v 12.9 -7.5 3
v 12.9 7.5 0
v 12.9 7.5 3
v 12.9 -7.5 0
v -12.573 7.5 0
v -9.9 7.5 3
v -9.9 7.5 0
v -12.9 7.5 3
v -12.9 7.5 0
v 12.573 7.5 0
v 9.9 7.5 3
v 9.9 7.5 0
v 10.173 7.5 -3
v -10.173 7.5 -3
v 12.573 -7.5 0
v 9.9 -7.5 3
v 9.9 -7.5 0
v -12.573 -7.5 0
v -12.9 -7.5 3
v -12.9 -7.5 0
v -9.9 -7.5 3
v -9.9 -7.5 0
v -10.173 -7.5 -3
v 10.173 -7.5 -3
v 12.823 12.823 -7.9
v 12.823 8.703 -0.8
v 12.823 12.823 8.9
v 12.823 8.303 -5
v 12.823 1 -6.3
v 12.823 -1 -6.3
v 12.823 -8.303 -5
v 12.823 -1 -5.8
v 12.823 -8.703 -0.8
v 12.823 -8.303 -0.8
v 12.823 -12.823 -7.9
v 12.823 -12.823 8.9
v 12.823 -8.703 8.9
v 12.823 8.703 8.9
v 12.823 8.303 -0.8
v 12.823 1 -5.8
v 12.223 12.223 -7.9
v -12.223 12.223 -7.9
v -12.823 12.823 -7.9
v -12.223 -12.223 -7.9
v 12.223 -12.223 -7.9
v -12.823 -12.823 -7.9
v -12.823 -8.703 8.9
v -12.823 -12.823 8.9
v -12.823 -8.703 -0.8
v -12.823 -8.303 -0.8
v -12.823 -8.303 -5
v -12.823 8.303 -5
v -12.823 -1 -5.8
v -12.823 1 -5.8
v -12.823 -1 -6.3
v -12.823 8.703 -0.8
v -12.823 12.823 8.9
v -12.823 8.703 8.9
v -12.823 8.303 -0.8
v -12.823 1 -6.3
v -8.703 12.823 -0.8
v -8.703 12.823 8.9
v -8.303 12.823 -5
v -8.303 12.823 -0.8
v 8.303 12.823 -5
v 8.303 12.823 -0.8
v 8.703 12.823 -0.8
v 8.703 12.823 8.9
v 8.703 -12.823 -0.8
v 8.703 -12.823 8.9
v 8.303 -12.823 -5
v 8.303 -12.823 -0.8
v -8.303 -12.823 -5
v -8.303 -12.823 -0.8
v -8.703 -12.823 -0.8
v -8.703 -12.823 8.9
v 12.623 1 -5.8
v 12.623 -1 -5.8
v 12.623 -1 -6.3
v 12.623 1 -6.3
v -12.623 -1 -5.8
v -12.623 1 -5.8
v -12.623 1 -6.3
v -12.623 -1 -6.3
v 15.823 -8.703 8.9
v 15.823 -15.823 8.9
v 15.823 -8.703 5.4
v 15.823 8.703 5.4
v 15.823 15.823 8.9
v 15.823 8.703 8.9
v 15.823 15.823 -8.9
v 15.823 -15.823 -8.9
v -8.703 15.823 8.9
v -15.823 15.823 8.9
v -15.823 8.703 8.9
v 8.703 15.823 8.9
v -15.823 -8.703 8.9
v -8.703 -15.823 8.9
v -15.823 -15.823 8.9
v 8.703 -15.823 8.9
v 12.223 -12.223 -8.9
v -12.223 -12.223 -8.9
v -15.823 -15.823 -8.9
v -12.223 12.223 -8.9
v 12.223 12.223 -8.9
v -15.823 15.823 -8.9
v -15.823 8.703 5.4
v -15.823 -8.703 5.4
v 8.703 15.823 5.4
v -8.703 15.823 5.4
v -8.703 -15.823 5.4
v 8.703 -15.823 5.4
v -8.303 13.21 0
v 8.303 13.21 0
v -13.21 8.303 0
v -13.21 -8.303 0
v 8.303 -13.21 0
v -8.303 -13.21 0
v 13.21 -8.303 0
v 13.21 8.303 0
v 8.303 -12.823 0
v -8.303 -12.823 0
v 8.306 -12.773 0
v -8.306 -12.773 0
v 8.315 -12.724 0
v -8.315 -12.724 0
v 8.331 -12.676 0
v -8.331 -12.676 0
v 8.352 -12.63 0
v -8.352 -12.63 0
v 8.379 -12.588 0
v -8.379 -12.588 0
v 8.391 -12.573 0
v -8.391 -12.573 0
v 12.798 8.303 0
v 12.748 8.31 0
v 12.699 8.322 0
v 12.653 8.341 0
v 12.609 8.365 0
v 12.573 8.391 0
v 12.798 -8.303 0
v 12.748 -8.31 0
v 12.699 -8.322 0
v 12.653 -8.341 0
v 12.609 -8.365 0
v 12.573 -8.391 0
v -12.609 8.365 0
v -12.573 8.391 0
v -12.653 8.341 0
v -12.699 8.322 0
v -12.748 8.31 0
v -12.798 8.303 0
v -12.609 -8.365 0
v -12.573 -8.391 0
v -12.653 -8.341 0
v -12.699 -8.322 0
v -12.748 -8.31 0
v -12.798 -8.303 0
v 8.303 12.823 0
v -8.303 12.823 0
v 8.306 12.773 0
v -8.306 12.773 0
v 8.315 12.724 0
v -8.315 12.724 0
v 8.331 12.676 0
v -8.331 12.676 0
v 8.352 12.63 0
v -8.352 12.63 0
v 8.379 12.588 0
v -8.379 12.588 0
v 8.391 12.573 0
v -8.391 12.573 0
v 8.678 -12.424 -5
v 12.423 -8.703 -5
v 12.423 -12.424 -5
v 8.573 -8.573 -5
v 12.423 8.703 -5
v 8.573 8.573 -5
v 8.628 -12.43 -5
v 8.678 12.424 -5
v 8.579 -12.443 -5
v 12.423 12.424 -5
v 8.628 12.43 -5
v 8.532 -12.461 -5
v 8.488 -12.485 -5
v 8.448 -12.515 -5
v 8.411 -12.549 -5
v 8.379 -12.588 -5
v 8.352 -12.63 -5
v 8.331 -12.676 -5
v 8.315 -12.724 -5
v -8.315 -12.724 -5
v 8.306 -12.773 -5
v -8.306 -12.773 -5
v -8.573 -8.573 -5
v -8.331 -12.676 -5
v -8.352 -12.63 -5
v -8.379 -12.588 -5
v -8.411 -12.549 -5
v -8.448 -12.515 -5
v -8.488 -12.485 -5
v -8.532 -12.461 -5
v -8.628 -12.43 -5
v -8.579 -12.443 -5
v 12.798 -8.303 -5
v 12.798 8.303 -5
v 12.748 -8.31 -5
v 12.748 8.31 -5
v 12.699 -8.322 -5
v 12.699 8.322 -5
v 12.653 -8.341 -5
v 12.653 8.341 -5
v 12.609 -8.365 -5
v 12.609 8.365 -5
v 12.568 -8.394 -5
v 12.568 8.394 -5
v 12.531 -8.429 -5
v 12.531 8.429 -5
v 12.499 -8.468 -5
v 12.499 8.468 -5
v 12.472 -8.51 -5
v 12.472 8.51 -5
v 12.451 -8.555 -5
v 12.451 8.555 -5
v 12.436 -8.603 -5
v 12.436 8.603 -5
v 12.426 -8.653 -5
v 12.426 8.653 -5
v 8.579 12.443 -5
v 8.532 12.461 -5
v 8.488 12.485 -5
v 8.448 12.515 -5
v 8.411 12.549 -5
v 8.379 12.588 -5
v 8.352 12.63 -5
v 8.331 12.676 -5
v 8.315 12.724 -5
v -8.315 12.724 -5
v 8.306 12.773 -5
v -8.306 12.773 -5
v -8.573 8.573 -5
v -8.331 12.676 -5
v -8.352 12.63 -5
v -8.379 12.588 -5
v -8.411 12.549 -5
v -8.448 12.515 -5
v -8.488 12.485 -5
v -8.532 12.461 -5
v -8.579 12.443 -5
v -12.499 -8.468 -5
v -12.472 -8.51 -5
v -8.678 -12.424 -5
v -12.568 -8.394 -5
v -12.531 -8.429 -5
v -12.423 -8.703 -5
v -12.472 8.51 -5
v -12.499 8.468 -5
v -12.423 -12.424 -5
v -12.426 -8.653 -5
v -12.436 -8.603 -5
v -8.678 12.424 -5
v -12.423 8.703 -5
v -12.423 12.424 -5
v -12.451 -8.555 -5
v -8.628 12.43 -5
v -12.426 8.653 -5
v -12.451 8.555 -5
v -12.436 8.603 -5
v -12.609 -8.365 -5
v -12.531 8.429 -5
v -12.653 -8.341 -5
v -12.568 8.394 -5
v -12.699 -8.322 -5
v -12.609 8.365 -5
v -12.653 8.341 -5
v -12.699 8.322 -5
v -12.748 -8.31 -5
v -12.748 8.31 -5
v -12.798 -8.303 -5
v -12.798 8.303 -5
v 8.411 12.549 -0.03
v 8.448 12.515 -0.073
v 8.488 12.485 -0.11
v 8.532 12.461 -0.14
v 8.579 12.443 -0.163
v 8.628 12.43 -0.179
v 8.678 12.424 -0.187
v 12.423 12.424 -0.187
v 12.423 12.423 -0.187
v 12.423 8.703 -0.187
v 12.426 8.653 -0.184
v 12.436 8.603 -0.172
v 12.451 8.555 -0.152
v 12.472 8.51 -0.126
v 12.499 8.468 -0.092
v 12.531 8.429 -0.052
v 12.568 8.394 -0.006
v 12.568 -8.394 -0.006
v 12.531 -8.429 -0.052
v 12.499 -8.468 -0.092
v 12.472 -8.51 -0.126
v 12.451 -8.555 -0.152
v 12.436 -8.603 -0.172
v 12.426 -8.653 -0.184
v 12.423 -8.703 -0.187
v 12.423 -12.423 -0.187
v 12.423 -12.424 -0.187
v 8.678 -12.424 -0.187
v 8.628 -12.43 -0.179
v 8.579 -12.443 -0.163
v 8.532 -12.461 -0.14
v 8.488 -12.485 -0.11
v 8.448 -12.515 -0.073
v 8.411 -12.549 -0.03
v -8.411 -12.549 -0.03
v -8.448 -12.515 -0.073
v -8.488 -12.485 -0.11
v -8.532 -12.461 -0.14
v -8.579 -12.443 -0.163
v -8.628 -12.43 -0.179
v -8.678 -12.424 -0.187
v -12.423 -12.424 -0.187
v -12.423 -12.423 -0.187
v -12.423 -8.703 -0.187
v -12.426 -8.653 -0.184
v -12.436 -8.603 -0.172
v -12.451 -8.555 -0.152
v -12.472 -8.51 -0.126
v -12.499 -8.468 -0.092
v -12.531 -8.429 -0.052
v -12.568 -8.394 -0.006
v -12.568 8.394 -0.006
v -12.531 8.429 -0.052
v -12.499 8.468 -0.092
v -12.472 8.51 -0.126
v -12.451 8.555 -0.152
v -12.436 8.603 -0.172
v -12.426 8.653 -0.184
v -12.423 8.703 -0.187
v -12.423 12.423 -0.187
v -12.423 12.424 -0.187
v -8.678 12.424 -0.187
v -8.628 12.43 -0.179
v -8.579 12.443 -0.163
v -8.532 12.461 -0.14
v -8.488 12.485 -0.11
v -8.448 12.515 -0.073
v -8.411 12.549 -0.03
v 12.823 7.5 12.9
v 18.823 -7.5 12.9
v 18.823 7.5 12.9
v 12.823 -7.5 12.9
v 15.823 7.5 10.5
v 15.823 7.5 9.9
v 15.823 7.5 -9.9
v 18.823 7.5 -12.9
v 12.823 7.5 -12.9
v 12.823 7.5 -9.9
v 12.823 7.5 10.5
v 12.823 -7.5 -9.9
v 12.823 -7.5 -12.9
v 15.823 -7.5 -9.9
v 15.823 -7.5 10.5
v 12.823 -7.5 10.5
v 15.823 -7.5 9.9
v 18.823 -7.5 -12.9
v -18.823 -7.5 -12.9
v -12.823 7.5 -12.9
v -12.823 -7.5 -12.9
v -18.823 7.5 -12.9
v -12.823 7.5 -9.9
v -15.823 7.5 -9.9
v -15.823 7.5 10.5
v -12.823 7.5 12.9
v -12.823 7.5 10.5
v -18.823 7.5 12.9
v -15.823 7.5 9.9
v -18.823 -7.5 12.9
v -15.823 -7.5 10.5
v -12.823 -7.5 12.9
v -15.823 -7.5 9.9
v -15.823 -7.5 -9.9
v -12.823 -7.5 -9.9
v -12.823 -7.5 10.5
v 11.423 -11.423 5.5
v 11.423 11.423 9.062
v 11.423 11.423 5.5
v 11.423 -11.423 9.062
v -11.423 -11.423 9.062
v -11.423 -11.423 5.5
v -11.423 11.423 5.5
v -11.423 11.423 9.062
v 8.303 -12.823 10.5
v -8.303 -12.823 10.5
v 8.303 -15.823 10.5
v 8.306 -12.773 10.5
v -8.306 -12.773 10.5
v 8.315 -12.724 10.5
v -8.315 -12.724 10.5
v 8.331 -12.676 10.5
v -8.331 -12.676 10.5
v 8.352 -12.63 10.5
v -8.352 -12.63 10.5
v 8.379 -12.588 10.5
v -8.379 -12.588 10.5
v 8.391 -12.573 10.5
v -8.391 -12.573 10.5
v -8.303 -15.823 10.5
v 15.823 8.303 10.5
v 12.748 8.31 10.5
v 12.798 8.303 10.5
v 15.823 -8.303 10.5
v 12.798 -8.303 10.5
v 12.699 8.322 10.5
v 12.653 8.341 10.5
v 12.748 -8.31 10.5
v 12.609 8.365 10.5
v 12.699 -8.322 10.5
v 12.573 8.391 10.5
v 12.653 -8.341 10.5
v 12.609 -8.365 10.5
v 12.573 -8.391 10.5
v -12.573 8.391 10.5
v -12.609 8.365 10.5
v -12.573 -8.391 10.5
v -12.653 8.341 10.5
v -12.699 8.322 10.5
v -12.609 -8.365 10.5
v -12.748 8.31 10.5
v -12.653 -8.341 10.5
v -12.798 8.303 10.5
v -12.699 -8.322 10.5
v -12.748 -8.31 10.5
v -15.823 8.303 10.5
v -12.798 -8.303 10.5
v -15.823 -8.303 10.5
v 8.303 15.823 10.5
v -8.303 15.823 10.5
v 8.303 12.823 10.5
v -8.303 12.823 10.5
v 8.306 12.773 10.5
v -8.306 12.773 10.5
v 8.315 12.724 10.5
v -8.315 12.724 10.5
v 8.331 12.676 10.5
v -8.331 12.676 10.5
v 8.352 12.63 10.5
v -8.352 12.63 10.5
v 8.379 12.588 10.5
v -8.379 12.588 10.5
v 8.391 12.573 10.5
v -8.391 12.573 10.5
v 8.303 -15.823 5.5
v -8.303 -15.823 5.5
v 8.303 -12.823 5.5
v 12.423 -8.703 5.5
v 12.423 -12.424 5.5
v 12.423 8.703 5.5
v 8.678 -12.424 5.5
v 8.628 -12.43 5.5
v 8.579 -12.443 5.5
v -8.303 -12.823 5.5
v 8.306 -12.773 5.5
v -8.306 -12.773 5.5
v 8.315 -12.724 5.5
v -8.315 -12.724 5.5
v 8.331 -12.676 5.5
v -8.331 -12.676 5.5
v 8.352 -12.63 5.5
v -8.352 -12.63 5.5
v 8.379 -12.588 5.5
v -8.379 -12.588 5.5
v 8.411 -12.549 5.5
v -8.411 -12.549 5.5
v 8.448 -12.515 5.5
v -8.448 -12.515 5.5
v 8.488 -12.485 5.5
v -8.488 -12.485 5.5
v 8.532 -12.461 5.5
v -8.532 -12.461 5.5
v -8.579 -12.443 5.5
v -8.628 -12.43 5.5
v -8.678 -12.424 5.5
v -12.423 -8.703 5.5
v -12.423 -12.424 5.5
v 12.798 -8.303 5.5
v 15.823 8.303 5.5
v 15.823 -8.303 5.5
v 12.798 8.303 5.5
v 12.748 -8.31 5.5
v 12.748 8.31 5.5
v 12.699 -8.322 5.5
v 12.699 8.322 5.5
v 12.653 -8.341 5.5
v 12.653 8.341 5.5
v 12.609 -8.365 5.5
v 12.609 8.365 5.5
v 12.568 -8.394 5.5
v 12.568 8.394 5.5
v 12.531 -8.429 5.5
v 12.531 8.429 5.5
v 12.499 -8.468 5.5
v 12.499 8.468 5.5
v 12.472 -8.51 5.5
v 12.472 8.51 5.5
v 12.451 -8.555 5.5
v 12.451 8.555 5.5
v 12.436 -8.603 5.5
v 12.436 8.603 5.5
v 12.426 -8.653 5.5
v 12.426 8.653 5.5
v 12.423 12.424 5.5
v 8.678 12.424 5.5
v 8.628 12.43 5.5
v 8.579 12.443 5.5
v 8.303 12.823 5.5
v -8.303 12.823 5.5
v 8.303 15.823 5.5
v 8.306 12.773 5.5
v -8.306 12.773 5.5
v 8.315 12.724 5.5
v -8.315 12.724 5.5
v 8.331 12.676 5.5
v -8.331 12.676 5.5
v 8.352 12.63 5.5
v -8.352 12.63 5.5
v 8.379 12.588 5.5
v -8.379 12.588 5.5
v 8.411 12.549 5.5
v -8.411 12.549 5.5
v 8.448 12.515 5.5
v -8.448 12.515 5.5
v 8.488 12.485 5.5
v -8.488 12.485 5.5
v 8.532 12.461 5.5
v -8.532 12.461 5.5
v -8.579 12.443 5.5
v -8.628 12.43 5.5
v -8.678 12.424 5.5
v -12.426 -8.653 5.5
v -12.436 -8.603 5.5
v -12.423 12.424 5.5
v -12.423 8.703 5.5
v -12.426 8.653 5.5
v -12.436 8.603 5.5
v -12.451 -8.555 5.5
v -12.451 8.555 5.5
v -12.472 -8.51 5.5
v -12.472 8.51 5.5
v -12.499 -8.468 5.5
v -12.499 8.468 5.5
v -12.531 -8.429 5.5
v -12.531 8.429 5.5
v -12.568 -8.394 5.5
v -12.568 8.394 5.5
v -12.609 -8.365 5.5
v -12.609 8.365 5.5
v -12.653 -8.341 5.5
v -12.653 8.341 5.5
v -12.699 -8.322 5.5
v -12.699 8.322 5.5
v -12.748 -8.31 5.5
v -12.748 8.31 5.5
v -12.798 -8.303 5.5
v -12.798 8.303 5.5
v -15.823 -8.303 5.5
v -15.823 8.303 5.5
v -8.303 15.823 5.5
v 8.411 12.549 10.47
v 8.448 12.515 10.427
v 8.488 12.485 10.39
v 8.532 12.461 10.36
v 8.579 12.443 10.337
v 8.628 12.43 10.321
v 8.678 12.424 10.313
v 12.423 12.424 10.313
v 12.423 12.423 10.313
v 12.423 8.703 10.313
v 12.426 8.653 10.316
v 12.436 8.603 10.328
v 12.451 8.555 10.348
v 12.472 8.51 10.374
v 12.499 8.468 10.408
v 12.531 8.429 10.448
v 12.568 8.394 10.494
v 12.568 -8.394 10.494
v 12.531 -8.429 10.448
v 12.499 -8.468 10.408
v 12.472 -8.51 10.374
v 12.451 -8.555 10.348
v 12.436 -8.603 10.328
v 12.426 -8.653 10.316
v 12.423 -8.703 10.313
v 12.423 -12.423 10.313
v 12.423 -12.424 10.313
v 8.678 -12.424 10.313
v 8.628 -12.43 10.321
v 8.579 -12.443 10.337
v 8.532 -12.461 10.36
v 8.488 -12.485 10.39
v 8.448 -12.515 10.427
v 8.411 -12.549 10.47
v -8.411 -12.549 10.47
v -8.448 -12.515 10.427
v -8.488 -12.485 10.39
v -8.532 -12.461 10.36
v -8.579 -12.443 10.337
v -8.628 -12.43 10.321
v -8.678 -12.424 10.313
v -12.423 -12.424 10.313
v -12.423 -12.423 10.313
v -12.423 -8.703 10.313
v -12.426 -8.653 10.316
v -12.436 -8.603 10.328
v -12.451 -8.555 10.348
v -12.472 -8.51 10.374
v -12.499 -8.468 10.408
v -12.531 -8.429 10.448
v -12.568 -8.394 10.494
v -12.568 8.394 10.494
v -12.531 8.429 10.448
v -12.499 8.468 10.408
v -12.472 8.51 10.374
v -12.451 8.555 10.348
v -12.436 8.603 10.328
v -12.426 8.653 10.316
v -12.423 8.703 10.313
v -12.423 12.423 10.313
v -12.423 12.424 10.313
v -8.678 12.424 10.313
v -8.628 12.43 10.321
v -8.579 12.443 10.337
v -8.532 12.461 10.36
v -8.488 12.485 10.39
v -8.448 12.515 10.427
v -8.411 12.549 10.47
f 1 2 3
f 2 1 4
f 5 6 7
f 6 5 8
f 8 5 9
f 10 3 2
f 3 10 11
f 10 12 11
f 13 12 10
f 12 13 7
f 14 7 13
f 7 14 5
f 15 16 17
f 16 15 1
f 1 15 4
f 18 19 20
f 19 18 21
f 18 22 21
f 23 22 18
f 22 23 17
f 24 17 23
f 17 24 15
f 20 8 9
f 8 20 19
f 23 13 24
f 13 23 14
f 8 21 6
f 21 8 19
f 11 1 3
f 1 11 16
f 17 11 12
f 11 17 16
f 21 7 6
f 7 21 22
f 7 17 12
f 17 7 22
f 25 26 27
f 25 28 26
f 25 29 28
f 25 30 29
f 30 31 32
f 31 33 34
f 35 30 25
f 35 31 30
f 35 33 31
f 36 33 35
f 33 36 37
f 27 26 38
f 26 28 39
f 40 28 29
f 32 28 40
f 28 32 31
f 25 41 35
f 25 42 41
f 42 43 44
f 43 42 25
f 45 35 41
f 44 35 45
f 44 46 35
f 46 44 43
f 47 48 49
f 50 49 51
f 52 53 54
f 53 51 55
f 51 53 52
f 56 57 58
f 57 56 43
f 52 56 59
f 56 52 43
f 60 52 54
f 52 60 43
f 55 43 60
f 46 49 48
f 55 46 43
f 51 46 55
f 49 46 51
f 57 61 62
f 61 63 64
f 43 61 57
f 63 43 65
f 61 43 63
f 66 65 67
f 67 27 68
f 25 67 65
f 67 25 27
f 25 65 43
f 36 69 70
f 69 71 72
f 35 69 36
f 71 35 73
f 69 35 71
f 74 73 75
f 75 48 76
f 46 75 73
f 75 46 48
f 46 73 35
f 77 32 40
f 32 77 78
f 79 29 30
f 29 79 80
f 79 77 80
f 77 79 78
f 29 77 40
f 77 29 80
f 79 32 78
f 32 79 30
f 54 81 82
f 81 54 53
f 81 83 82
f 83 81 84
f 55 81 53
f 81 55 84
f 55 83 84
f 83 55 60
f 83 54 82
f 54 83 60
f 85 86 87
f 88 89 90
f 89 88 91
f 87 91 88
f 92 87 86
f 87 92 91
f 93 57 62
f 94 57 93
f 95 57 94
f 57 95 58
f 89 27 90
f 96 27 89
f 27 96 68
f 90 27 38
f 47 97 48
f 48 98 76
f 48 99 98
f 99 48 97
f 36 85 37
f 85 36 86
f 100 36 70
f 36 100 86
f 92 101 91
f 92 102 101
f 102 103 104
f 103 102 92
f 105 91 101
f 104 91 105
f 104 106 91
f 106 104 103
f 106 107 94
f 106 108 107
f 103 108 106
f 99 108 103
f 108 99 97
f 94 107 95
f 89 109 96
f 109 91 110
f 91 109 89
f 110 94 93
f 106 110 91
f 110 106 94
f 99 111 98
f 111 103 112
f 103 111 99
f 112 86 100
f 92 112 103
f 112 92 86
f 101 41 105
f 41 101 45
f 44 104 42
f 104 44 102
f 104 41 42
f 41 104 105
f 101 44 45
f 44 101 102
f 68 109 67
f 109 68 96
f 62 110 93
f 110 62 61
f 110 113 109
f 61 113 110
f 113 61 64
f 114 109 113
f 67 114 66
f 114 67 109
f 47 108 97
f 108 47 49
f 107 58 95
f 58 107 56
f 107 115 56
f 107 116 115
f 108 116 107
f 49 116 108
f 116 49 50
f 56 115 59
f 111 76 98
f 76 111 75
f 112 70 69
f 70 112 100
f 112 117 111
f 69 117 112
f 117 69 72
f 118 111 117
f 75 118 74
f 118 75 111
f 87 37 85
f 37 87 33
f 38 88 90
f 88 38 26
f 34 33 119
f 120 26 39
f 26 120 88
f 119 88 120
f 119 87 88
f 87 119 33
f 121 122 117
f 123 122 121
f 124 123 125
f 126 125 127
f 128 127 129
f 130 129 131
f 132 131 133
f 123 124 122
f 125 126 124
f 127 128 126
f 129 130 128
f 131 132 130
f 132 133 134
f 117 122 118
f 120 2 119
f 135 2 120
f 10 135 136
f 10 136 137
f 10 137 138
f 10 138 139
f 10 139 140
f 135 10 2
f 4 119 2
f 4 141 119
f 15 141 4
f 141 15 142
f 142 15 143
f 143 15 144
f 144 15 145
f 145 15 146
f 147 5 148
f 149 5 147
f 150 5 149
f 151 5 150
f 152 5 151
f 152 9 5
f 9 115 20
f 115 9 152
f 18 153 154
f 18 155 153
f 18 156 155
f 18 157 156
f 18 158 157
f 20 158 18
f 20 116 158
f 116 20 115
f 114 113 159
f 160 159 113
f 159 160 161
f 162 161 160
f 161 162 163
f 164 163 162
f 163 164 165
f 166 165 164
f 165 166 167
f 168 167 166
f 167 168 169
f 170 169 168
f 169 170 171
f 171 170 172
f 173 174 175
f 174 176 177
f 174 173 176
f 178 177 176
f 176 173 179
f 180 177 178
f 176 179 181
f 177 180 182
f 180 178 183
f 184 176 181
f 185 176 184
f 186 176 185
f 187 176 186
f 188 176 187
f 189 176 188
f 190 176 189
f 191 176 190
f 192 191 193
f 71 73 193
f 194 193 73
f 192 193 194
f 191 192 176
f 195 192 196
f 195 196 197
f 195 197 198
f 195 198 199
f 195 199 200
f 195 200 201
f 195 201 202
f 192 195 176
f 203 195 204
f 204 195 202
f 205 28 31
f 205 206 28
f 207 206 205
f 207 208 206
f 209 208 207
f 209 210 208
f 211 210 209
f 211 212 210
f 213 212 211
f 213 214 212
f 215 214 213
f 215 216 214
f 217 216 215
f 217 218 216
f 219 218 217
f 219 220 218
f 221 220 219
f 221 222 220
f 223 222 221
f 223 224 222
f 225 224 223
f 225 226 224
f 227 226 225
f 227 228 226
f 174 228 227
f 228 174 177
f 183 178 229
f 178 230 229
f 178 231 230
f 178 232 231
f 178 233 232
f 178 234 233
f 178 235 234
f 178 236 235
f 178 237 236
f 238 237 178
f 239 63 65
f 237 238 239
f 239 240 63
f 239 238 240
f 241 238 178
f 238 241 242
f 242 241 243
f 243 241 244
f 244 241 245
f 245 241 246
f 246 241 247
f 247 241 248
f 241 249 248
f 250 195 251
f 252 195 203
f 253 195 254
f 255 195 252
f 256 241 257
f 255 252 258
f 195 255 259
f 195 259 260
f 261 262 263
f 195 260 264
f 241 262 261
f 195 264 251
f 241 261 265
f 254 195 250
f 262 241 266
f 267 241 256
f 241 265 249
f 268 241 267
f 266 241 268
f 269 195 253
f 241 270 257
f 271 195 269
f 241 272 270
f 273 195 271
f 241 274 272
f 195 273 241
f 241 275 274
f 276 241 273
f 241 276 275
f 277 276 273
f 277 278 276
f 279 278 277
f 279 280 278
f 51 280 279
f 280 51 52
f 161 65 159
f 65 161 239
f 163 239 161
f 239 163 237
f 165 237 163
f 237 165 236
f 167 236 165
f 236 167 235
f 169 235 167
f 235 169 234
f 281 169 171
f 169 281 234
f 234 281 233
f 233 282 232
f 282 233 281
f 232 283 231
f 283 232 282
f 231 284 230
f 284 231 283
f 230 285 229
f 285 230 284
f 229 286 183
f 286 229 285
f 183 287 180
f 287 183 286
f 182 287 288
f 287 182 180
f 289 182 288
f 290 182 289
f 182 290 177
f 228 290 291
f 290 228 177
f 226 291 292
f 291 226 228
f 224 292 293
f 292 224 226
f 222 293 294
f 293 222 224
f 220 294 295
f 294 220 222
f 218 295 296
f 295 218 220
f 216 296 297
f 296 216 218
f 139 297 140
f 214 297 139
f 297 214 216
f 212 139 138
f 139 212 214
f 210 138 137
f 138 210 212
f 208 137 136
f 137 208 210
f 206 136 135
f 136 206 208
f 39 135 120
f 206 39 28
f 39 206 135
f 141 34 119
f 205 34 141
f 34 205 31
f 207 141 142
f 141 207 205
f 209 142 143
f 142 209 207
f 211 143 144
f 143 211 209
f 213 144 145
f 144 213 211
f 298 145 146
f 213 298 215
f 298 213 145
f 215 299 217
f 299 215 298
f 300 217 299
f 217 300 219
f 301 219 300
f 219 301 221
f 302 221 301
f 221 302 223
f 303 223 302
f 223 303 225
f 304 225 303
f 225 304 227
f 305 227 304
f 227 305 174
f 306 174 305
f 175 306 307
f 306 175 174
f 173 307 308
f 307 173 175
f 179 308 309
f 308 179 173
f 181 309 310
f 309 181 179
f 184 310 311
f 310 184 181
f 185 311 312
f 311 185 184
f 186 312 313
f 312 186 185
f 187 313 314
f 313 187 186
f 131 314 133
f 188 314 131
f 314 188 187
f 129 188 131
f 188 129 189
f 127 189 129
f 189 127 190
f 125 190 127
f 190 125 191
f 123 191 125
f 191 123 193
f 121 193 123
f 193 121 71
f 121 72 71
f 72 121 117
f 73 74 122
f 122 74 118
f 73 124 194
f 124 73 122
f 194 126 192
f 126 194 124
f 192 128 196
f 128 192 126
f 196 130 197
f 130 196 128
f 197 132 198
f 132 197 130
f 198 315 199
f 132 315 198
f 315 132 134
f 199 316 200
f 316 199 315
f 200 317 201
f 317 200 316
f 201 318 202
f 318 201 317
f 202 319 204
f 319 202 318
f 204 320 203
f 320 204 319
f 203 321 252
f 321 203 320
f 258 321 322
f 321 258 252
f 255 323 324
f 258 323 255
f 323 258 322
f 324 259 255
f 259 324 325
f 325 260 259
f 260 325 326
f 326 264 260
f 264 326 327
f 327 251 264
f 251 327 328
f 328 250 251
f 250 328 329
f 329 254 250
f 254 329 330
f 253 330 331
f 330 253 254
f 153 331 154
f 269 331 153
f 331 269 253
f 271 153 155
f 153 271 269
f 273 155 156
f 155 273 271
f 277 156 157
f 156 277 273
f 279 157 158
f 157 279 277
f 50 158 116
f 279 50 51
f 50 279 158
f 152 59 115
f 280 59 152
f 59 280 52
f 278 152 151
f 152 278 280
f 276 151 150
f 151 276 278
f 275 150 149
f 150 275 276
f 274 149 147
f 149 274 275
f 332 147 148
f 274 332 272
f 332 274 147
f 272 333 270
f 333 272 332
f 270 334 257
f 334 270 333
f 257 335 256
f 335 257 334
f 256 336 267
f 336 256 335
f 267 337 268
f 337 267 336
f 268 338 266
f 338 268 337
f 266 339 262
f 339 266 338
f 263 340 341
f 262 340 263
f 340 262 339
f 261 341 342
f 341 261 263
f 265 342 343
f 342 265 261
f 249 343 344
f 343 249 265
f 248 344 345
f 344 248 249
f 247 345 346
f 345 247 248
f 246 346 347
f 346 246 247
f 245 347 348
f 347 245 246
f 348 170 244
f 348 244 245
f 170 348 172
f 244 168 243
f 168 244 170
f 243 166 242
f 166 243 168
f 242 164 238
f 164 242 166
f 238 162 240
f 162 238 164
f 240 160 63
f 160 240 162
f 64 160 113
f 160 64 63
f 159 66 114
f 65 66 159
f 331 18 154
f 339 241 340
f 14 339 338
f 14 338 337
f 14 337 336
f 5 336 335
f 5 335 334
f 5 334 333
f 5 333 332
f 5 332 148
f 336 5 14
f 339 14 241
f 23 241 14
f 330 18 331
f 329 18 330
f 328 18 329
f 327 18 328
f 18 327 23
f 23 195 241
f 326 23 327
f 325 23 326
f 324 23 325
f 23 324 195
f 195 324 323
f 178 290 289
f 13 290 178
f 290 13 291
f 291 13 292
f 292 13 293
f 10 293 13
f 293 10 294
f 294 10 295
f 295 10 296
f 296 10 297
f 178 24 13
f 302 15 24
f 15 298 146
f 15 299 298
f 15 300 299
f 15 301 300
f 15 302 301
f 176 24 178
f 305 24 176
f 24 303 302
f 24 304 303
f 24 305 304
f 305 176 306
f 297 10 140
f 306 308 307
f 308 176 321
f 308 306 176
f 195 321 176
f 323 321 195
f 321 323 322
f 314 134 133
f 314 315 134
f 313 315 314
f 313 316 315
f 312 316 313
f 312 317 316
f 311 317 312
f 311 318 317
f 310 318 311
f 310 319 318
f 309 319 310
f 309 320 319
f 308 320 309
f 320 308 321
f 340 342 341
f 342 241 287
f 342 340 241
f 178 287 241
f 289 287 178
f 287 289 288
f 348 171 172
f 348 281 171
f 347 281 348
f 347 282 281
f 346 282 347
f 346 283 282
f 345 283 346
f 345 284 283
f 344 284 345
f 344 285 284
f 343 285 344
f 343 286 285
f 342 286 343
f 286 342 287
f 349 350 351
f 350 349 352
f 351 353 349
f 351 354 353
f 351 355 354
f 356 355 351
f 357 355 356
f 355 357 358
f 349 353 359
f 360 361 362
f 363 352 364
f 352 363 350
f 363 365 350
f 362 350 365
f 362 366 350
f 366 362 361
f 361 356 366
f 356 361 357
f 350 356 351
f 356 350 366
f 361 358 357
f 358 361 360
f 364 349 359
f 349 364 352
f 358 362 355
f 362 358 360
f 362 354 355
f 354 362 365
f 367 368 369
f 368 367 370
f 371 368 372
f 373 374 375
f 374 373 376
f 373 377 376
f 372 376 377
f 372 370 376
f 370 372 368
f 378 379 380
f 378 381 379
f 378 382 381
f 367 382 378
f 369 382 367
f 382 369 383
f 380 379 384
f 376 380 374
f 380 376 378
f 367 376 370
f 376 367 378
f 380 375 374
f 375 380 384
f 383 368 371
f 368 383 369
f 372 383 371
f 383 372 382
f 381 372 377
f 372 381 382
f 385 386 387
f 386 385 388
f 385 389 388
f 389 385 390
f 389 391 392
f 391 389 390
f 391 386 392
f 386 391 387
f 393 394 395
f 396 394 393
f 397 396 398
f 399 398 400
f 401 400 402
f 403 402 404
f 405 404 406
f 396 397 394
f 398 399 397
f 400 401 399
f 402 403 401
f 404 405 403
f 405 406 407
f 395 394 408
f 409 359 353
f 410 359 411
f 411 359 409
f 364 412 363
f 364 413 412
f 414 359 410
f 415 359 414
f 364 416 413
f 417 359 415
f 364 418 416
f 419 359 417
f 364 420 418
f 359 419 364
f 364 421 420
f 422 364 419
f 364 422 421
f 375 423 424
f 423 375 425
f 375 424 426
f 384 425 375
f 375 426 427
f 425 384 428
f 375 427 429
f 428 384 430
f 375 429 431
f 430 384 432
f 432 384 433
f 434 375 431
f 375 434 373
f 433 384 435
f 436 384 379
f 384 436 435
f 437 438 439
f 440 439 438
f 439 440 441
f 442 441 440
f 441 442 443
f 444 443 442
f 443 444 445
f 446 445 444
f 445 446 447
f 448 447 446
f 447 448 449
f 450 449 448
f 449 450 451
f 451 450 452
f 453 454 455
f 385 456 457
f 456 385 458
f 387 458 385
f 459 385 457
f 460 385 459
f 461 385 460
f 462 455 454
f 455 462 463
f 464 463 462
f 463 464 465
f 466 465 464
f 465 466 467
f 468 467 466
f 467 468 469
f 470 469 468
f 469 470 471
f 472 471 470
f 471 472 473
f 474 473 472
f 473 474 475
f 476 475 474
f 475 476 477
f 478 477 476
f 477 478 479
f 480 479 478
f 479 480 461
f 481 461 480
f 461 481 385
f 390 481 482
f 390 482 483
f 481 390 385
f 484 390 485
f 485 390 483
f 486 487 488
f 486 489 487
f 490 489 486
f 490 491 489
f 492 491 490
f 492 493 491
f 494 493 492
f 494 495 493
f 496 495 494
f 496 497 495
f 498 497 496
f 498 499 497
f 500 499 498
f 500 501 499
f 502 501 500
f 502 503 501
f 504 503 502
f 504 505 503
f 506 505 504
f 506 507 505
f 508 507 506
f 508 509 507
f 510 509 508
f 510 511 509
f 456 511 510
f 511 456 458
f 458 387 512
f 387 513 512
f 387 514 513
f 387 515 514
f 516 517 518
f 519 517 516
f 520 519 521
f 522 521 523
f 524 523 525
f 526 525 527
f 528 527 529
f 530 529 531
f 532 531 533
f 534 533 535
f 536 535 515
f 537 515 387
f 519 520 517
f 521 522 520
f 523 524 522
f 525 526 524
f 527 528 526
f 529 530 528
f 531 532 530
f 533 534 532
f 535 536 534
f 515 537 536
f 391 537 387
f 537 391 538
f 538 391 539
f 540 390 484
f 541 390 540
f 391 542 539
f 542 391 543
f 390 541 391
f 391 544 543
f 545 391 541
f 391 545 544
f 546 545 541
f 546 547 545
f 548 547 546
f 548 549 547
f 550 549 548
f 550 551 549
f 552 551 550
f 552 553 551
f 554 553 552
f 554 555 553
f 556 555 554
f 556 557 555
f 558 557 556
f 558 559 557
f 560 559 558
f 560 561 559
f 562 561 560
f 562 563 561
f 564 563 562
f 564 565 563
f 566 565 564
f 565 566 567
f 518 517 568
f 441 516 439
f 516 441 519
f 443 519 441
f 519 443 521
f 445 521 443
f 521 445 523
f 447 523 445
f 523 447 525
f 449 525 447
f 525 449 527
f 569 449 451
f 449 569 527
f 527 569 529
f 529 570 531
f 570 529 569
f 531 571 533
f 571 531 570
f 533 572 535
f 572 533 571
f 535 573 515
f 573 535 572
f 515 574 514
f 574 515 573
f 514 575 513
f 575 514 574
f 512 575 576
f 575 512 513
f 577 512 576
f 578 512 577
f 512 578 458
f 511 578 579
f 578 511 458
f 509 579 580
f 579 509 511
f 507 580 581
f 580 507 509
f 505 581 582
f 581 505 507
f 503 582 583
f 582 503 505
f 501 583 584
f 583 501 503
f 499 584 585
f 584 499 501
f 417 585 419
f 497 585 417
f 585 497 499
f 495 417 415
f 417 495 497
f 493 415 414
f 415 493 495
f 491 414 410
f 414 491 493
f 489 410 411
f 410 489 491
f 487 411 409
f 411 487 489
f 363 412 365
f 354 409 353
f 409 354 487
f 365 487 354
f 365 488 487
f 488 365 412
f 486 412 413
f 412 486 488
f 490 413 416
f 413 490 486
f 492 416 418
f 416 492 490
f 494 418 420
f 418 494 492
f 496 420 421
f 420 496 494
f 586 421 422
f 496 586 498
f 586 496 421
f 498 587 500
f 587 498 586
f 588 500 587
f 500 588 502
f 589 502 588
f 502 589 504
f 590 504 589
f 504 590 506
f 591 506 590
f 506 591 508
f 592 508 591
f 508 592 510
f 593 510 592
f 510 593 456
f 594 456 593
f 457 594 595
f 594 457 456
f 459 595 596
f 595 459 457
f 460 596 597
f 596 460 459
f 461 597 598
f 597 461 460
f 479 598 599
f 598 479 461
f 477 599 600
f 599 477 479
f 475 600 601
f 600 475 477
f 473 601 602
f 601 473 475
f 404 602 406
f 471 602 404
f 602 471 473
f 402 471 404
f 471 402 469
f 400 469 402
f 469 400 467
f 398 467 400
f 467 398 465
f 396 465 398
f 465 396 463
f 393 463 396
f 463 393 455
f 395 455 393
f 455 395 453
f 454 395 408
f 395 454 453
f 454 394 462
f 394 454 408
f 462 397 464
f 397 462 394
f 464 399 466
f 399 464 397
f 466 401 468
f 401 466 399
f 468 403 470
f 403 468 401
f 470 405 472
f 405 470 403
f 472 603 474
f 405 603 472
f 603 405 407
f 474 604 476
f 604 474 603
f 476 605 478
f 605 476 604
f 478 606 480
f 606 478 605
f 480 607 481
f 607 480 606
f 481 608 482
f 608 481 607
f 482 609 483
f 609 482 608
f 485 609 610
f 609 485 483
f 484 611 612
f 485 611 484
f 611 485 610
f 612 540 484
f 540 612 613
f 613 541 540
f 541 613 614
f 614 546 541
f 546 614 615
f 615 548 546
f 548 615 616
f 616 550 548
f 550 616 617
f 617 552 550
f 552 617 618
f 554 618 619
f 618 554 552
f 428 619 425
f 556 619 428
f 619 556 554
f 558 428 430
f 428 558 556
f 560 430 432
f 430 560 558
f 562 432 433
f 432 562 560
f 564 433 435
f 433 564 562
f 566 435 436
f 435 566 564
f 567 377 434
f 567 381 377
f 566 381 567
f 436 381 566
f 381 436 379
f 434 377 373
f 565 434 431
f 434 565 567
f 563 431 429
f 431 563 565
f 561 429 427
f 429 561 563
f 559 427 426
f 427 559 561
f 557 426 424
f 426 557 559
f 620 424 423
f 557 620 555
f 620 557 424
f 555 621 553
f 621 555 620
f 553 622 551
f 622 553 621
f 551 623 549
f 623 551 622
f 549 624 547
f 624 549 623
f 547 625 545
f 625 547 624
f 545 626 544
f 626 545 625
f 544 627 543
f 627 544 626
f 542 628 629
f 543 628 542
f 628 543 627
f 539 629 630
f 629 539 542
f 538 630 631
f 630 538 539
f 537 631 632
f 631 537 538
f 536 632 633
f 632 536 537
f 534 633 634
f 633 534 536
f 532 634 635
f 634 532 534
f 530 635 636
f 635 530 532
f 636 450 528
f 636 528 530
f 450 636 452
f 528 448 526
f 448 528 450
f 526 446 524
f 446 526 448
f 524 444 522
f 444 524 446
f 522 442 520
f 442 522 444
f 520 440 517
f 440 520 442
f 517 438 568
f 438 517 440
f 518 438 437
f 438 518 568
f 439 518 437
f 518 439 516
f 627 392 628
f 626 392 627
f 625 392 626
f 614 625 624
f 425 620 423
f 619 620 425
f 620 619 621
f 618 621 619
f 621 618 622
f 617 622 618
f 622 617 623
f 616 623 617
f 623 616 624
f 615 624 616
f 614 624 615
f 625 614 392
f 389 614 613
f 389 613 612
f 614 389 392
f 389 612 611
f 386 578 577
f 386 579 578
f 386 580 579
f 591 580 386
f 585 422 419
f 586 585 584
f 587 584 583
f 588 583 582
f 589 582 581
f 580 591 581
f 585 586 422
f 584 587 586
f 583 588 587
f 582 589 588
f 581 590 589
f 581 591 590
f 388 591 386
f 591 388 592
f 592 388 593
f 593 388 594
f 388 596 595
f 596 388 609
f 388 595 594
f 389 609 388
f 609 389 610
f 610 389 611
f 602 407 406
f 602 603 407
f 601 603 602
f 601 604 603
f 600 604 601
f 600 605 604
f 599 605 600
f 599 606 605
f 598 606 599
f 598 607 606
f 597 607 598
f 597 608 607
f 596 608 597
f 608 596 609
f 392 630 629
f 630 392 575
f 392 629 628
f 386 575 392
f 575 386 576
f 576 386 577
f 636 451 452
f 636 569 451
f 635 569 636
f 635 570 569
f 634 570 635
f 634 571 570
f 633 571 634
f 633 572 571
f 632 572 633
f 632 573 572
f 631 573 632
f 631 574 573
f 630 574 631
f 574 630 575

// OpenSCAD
// file: cap.scad
include <meta.scad>;

$fn=50;
capFit=0.4; //mm, trace a circle of this radius around the crown pieces to define the cap cutouts
springs_length = 15; //mm
springs_thickness = 1; //mm

module cap(deviceDim, springs=false, clips=false){
    vDeviceDim=deviceDim+deviceFudge;
    xyLen=vDeviceDim+wallT*2;
    
    capX = xyLen;
    capY = xyLen;
    
    windowDim = deviceDim-4*2;
    difference(){
        linear_extrude(height=capT){
            difference(){
                square([capX,capY], center=true);
                minkowski(){
                  projection(cut = true) translate([0,0,-totalHeight/2+1]) base(deviceDim);
                  circle(capFit,center=true);
                }
            }
        }
        
        linear_extrude(height=capT,scale=windowDim/deviceDim){
            square([deviceDim,deviceDim], center=true);
        }
        if (springs){
            cube_offset = deviceDim/2-springs_length/2-capFit+deviceFudge/2-springs_thickness;
            translate ([cube_offset,cube_offset,0]) cube([springs_length,springs_length,3*capT],center=true);
            translate ([-cube_offset,-cube_offset,0]) cube([springs_length,springs_length,3*capT],center=true);
            translate ([cube_offset,-cube_offset,0]) cube([springs_length,springs_length,3*capT],center=true);
            translate ([-cube_offset,cube_offset,0]) cube([springs_length,springs_length,3*capT],center=true);
        }
    }
}

rotate([180,0,0]) cap(25.146, springs=false);
// file: clips.scad
include <meta.scad>;

innerClipLength = totalHeight-crownHeight+capT+deviceFudge;

module clip ( deviceDim ) { //mm, x,y dimension of substrate, pcb
    
    clipLength=15;
    clipThickness=3;

    rotate([-90,0,0])
    difference(){
        cube([innerClipLength+2*clipThickness,clipThickness+wallT,clipLength],center=true);
        translate([0,-clipThickness,0]) cube([innerClipLength,clipThickness+wallT,clipLength],center=true);
    }
}
clip ( 25.146 );
// file: meta.scad
deviceFudge=0.5;//mm, fudge factor to account for printing inaccuracy, shrinkage
PCBThickness=1.6; //mm
pinRecepticalTop=5.5;//mm above pcb that the pin receptical extends
pinsHeight=pinRecepticalTop+4.2+2;//mm above pcb, fully extended
maxSubstrateThickness=3;//mm
wallT=3;//mm, wall thickness
PCBShelfW=0.6;//mm, the pcb sits on this
belowPBC=1;//mm extension below PCB
crownFraction=0.55;//fraction of each side length to subtract to make extension corners

capT = 5; //mm cap thickness

solidHeight=pinsHeight;//mm above pcb for solid wall
crownHeight=maxSubstrateThickness+0.5;//mm, corners extension above pin ends
totalHeight=belowPBC+PCBThickness+solidHeight+crownHeight;

module base ( xyDev ) {
    vDeviceDim=xyDev+deviceFudge;
    xyLen=vDeviceDim+wallT*2;
    difference(){
        cube([xyLen,xyLen,totalHeight],center = true);
        difference(){
            translate([0,0,belowPBC]) cube([vDeviceDim,vDeviceDim,totalHeight],center = true);
            chunk_width = 2;
            chunk_outdent = 0.2;
            chunk_height = 0.5;
            //these parts clip in the PCB
            translate([vDeviceDim/2-chunk_outdent,-chunk_width/2,-totalHeight/2+belowPBC+PCBThickness]) cube([xyLen,chunk_width,chunk_height],center = false);
            rotate([0,0,180]) translate([vDeviceDim/2-chunk_outdent,-chunk_width/2,-totalHeight/2+belowPBC+PCBThickness]) cube([xyLen,chunk_width,chunk_height],center = false);
            
        }
        cube([vDeviceDim-2*PCBShelfW,vDeviceDim-2*PCBShelfW,totalHeight+1],center = true);
        
        translate([0,xyLen/2,totalHeight/2+(crownHeight+1)/2-crownHeight]) cube([xyLen*crownFraction,xyLen,crownHeight+1],center = true);
        rotate([0,0,180]) translate([-xyLen*crownFraction/2,-xyLen/2,totalHeight/2-crownHeight]) rotate([0,90,0])  linear_extrude(height=xyLen*crownFraction) polygon([[0,0],[0,wallT],[(pinsHeight-pinRecepticalTop),wallT]]);
        
        rotate([0,0,90]) translate([0,xyLen/2,totalHeight/2+(crownHeight+1)/2-crownHeight]) cube([xyLen*crownFraction,xyLen,crownHeight+1],center = true);
        rotate([0,0,270]) translate([-xyLen*crownFraction/2,-xyLen/2,totalHeight/2-crownHeight]) rotate([0,90,0])  linear_extrude(height=xyLen*crownFraction) polygon([[0,0],[0,wallT],[(pinsHeight-pinRecepticalTop),wallT]]);
        
        rotate([0,0,180]) translate([0,xyLen/2,totalHeight/2+(crownHeight+1)/2-crownHeight]) cube([xyLen*crownFraction,xyLen,crownHeight+1],center = true);
        translate([-xyLen*crownFraction/2,-xyLen/2,totalHeight/2-crownHeight]) rotate([0,90,0])  linear_extrude(height=xyLen*crownFraction) polygon([[0,0],[0,wallT],[(pinsHeight-pinRecepticalTop),wallT]]);
        
        rotate([0,0,270]) translate([0,xyLen/2,totalHeight/2+(crownHeight+1)/2-crownHeight]) cube([xyLen*crownFraction,xyLen,crownHeight+1],center = true);
        rotate([0,0,90]) translate([-xyLen*crownFraction/2,-xyLen/2,totalHeight/2-crownHeight]) rotate([0,90,0])  linear_extrude(height=xyLen*crownFraction) polygon([[0,0],[0,wallT],[(pinsHeight-pinRecepticalTop),wallT]]);
    }
}
// main file
include <meta.scad>;
include <clips.scad>;
include <cap.scad>;

//deviceDim=28; //mm, x,y dimension of substrate, pcb OLD
//deviceDim=30; //mm, x,y dimension of substrate, pcb
//deviceDim=25; //mm, x,y dimension of substrate, pcb, DBG
deviceDim=25.146; //mm, x,y dimension of substrate, pcb, MIT
base(deviceDim);
translate([+(deviceDim+deviceFudge)/2+wallT,0,0]) rotate([0,-90,0]) clip(deviceDim);
translate([-(deviceDim+deviceFudge)/2-wallT,0,0]) rotate([0, 90,0]) clip(deviceDim);

translate([0,0,totalHeight/2+capT-crownHeight+0.1]) rotate([180,0,0]) cap(deviceDim,springs=true);
